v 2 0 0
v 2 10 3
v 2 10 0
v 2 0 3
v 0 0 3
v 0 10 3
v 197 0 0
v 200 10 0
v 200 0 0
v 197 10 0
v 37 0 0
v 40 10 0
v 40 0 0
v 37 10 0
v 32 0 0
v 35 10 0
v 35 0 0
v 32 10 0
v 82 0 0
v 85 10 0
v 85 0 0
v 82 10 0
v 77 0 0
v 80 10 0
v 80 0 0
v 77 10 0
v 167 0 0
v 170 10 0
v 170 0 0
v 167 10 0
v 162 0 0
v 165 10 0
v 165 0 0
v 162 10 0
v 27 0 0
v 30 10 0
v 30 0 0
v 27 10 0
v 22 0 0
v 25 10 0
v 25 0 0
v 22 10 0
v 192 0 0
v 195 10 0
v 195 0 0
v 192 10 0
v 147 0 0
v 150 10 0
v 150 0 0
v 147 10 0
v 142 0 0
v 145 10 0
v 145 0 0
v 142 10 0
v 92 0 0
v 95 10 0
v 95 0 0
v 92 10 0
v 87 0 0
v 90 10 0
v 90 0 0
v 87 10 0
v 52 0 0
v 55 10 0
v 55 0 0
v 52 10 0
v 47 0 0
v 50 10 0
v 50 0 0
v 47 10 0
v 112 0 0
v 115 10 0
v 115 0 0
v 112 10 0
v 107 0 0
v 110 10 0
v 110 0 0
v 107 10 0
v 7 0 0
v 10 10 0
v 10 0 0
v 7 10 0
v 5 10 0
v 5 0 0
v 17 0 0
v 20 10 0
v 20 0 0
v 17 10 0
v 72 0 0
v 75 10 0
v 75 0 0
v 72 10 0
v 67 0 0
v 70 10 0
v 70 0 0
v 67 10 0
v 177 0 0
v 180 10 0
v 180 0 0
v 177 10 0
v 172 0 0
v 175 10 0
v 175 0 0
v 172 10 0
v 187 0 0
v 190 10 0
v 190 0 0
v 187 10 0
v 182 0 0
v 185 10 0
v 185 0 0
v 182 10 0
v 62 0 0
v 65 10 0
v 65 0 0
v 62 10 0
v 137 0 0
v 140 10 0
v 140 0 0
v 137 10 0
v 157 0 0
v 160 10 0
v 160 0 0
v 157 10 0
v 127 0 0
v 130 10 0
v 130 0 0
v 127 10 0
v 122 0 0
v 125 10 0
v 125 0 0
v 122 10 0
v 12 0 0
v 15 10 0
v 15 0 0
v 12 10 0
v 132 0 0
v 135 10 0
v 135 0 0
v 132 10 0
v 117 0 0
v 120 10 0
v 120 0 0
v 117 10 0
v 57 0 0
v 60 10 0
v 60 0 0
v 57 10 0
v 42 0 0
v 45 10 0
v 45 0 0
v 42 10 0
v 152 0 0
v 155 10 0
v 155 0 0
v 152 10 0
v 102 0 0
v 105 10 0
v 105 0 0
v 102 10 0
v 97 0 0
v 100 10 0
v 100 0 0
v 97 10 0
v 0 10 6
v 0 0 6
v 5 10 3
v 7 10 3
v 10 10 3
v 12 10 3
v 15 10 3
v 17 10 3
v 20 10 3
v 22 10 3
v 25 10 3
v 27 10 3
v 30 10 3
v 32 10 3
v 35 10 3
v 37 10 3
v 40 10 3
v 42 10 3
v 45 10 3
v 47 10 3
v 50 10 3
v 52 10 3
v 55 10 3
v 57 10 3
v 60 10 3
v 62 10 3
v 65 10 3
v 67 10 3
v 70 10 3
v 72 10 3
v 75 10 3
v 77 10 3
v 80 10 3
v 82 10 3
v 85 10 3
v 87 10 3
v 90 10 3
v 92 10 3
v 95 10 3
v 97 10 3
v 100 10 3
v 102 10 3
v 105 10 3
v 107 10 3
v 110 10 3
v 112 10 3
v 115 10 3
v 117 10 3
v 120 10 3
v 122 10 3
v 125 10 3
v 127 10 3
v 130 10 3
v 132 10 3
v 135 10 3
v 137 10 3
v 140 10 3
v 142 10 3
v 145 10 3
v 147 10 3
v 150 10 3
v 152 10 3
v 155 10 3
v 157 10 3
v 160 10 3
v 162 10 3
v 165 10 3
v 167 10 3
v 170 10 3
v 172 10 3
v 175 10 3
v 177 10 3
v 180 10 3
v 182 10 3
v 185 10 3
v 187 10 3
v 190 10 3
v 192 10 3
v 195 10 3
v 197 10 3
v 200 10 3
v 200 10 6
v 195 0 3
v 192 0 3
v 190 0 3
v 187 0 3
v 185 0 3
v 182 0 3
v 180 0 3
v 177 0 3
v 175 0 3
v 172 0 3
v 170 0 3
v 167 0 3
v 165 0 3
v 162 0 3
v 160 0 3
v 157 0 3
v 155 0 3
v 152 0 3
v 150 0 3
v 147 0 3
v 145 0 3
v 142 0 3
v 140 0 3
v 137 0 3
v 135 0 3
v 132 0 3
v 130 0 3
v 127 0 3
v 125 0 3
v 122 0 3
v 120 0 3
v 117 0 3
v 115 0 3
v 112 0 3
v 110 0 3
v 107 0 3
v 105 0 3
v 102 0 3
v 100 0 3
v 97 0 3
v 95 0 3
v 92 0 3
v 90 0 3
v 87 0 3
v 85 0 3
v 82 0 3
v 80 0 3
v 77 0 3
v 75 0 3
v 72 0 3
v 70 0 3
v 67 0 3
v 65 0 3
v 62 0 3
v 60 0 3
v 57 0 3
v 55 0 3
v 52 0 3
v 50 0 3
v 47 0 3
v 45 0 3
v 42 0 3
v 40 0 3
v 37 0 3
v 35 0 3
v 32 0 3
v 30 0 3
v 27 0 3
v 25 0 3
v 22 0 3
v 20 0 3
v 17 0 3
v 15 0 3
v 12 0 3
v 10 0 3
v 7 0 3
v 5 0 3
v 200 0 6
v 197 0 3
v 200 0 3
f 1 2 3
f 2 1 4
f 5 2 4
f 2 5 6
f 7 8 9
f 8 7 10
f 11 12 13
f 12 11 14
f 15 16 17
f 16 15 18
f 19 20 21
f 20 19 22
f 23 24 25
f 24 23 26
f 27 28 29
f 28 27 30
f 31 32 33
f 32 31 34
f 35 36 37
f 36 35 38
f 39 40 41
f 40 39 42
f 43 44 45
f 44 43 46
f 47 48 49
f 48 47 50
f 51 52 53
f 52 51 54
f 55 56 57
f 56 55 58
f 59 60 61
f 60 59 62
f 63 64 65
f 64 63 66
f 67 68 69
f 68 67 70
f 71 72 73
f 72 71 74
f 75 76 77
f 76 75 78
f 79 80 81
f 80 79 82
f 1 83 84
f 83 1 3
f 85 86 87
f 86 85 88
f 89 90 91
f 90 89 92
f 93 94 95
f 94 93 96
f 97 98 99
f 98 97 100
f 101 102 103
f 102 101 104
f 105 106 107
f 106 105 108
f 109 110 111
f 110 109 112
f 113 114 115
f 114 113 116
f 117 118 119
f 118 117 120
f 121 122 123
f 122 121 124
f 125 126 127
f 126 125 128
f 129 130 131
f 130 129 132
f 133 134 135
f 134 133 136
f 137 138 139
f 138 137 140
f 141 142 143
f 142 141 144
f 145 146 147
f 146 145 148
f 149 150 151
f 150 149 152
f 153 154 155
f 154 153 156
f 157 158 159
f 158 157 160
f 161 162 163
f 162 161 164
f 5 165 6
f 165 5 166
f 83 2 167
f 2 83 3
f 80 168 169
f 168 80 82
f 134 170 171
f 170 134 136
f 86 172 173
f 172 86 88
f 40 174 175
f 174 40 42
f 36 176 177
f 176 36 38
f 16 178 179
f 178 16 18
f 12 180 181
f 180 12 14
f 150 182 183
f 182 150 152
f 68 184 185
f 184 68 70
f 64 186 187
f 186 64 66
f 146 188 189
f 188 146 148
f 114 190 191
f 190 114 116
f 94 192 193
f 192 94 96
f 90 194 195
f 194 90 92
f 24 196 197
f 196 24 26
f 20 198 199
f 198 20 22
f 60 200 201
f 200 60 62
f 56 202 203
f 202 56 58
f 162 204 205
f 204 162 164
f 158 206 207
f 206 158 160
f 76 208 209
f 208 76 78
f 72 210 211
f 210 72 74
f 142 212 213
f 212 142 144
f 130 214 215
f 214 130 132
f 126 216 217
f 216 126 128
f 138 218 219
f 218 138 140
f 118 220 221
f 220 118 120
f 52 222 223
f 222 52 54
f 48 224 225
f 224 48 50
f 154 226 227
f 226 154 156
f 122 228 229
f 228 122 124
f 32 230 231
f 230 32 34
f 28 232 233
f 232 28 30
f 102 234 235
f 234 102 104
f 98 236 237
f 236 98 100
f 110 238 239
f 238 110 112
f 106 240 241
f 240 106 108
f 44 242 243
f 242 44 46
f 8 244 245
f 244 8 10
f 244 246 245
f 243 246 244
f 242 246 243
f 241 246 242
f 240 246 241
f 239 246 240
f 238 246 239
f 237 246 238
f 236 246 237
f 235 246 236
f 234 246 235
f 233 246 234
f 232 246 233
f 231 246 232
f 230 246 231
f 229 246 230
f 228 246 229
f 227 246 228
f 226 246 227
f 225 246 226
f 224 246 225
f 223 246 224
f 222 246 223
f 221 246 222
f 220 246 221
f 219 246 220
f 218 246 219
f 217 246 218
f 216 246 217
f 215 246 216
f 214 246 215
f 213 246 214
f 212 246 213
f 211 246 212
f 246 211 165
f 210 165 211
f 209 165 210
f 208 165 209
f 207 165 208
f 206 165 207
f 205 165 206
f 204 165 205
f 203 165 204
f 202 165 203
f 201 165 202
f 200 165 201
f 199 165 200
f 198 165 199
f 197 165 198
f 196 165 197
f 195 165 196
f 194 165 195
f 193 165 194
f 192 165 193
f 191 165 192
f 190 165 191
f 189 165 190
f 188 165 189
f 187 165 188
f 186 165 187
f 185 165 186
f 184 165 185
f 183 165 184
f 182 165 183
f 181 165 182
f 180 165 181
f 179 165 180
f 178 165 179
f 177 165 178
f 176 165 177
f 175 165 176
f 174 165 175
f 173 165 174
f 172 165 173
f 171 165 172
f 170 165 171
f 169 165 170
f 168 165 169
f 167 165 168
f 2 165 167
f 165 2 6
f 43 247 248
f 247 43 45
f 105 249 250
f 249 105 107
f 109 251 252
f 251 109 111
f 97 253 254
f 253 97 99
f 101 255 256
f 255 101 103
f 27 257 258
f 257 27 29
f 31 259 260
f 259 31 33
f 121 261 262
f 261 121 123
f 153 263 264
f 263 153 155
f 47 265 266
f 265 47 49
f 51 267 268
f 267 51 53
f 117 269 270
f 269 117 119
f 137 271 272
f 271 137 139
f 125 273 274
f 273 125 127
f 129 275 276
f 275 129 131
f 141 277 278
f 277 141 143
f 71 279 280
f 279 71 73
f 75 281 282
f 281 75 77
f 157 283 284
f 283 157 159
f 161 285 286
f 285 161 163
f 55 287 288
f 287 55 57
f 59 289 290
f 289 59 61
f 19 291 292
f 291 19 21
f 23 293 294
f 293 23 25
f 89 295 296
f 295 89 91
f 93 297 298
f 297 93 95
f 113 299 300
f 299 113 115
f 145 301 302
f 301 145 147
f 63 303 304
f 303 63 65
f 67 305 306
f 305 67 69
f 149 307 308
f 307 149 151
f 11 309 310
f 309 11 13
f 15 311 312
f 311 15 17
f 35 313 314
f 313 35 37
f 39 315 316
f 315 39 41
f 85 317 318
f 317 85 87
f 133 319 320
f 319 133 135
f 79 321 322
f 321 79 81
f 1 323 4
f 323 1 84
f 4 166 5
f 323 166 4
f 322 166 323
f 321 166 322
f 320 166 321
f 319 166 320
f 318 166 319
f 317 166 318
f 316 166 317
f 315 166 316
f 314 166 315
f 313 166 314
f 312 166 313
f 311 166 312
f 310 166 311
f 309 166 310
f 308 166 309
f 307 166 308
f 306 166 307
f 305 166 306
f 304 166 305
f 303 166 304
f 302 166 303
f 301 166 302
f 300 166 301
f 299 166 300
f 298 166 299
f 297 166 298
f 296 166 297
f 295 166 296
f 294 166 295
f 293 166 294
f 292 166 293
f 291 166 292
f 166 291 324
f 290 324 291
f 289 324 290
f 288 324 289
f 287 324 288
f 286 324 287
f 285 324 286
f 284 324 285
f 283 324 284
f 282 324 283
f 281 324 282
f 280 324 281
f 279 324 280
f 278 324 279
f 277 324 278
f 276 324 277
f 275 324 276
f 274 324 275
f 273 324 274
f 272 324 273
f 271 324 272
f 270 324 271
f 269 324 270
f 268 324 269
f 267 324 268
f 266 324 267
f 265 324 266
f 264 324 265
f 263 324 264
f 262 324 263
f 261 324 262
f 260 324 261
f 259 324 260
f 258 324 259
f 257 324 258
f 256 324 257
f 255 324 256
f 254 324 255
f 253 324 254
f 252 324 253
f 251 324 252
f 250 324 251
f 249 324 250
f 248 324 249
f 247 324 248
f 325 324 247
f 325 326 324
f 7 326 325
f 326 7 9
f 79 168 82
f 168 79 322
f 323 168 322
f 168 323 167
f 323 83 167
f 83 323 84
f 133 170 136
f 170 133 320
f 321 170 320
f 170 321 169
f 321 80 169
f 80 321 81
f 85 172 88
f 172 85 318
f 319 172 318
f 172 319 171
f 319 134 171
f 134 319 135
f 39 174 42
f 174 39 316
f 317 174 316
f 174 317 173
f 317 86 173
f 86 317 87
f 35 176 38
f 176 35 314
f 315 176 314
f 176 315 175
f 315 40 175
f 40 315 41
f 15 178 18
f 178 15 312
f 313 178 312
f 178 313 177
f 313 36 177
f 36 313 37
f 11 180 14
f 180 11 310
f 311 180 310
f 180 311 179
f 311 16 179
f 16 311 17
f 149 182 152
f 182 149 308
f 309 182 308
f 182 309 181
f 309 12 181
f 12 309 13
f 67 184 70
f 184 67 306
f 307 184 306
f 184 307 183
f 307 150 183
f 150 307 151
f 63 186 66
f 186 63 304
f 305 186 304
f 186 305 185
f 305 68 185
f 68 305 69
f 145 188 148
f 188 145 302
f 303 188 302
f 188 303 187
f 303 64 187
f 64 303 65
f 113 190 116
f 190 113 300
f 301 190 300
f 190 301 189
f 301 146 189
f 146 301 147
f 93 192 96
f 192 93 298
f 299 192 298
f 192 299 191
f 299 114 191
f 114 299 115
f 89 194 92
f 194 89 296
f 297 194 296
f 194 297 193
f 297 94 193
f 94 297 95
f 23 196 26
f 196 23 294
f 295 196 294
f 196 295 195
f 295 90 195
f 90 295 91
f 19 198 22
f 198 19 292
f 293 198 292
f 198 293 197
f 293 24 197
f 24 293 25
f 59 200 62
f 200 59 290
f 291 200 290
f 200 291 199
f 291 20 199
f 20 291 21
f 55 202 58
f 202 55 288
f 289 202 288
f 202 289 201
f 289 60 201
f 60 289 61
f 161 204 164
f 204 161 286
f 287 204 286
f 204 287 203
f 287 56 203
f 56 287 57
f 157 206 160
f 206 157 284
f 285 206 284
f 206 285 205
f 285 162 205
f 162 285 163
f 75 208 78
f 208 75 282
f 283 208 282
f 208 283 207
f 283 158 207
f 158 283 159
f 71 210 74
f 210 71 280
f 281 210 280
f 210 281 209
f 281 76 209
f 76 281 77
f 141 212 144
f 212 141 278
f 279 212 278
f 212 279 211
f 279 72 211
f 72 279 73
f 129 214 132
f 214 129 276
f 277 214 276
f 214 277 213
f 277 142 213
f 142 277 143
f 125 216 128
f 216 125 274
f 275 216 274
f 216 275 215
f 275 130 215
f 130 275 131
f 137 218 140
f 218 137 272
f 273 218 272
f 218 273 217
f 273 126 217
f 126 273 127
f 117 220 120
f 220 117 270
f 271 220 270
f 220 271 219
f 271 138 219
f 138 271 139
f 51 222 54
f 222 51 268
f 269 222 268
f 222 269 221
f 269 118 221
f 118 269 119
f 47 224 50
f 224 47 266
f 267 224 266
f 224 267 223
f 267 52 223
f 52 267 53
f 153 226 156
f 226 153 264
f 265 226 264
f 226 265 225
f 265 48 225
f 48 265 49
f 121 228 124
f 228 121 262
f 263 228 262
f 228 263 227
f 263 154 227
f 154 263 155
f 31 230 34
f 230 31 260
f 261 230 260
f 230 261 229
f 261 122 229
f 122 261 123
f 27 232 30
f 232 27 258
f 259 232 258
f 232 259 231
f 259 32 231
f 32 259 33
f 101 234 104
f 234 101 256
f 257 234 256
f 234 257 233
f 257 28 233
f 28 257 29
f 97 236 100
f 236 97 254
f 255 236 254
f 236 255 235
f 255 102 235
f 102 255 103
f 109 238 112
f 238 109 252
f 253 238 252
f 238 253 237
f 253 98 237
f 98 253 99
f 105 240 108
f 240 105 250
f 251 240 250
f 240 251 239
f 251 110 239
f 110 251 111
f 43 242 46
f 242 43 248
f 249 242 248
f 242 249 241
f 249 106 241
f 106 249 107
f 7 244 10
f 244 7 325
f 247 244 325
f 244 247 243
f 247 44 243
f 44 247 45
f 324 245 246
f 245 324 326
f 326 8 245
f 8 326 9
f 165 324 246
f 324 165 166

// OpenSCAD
//////////////////////////////////////////////
//  ***TeMoG - Tentacle Mold Generator***   //
//  by Jonas Jørgensen (jonj@sdu.dk) 2020   //
//                                          //
//  Shared under a Creative Commons         //
//  Attribution-ShareAlike (CC BY-SA 3.0)   //
//  license                                 //
//////////////////////////////////////////////

//Guide to adjust winding distance when fiber reinforcing the tentacle

$fn=30;

length=200;
width=10;
thickness=3;
threadspace=2;
betweenThreads=3;



difference(){
cube([length, width, thickness*2]);
for(i = [0:(threadspace+betweenThreads):length]) {
    translate([i,0,0]) cube([threadspace, width, thickness]);
    }

}
